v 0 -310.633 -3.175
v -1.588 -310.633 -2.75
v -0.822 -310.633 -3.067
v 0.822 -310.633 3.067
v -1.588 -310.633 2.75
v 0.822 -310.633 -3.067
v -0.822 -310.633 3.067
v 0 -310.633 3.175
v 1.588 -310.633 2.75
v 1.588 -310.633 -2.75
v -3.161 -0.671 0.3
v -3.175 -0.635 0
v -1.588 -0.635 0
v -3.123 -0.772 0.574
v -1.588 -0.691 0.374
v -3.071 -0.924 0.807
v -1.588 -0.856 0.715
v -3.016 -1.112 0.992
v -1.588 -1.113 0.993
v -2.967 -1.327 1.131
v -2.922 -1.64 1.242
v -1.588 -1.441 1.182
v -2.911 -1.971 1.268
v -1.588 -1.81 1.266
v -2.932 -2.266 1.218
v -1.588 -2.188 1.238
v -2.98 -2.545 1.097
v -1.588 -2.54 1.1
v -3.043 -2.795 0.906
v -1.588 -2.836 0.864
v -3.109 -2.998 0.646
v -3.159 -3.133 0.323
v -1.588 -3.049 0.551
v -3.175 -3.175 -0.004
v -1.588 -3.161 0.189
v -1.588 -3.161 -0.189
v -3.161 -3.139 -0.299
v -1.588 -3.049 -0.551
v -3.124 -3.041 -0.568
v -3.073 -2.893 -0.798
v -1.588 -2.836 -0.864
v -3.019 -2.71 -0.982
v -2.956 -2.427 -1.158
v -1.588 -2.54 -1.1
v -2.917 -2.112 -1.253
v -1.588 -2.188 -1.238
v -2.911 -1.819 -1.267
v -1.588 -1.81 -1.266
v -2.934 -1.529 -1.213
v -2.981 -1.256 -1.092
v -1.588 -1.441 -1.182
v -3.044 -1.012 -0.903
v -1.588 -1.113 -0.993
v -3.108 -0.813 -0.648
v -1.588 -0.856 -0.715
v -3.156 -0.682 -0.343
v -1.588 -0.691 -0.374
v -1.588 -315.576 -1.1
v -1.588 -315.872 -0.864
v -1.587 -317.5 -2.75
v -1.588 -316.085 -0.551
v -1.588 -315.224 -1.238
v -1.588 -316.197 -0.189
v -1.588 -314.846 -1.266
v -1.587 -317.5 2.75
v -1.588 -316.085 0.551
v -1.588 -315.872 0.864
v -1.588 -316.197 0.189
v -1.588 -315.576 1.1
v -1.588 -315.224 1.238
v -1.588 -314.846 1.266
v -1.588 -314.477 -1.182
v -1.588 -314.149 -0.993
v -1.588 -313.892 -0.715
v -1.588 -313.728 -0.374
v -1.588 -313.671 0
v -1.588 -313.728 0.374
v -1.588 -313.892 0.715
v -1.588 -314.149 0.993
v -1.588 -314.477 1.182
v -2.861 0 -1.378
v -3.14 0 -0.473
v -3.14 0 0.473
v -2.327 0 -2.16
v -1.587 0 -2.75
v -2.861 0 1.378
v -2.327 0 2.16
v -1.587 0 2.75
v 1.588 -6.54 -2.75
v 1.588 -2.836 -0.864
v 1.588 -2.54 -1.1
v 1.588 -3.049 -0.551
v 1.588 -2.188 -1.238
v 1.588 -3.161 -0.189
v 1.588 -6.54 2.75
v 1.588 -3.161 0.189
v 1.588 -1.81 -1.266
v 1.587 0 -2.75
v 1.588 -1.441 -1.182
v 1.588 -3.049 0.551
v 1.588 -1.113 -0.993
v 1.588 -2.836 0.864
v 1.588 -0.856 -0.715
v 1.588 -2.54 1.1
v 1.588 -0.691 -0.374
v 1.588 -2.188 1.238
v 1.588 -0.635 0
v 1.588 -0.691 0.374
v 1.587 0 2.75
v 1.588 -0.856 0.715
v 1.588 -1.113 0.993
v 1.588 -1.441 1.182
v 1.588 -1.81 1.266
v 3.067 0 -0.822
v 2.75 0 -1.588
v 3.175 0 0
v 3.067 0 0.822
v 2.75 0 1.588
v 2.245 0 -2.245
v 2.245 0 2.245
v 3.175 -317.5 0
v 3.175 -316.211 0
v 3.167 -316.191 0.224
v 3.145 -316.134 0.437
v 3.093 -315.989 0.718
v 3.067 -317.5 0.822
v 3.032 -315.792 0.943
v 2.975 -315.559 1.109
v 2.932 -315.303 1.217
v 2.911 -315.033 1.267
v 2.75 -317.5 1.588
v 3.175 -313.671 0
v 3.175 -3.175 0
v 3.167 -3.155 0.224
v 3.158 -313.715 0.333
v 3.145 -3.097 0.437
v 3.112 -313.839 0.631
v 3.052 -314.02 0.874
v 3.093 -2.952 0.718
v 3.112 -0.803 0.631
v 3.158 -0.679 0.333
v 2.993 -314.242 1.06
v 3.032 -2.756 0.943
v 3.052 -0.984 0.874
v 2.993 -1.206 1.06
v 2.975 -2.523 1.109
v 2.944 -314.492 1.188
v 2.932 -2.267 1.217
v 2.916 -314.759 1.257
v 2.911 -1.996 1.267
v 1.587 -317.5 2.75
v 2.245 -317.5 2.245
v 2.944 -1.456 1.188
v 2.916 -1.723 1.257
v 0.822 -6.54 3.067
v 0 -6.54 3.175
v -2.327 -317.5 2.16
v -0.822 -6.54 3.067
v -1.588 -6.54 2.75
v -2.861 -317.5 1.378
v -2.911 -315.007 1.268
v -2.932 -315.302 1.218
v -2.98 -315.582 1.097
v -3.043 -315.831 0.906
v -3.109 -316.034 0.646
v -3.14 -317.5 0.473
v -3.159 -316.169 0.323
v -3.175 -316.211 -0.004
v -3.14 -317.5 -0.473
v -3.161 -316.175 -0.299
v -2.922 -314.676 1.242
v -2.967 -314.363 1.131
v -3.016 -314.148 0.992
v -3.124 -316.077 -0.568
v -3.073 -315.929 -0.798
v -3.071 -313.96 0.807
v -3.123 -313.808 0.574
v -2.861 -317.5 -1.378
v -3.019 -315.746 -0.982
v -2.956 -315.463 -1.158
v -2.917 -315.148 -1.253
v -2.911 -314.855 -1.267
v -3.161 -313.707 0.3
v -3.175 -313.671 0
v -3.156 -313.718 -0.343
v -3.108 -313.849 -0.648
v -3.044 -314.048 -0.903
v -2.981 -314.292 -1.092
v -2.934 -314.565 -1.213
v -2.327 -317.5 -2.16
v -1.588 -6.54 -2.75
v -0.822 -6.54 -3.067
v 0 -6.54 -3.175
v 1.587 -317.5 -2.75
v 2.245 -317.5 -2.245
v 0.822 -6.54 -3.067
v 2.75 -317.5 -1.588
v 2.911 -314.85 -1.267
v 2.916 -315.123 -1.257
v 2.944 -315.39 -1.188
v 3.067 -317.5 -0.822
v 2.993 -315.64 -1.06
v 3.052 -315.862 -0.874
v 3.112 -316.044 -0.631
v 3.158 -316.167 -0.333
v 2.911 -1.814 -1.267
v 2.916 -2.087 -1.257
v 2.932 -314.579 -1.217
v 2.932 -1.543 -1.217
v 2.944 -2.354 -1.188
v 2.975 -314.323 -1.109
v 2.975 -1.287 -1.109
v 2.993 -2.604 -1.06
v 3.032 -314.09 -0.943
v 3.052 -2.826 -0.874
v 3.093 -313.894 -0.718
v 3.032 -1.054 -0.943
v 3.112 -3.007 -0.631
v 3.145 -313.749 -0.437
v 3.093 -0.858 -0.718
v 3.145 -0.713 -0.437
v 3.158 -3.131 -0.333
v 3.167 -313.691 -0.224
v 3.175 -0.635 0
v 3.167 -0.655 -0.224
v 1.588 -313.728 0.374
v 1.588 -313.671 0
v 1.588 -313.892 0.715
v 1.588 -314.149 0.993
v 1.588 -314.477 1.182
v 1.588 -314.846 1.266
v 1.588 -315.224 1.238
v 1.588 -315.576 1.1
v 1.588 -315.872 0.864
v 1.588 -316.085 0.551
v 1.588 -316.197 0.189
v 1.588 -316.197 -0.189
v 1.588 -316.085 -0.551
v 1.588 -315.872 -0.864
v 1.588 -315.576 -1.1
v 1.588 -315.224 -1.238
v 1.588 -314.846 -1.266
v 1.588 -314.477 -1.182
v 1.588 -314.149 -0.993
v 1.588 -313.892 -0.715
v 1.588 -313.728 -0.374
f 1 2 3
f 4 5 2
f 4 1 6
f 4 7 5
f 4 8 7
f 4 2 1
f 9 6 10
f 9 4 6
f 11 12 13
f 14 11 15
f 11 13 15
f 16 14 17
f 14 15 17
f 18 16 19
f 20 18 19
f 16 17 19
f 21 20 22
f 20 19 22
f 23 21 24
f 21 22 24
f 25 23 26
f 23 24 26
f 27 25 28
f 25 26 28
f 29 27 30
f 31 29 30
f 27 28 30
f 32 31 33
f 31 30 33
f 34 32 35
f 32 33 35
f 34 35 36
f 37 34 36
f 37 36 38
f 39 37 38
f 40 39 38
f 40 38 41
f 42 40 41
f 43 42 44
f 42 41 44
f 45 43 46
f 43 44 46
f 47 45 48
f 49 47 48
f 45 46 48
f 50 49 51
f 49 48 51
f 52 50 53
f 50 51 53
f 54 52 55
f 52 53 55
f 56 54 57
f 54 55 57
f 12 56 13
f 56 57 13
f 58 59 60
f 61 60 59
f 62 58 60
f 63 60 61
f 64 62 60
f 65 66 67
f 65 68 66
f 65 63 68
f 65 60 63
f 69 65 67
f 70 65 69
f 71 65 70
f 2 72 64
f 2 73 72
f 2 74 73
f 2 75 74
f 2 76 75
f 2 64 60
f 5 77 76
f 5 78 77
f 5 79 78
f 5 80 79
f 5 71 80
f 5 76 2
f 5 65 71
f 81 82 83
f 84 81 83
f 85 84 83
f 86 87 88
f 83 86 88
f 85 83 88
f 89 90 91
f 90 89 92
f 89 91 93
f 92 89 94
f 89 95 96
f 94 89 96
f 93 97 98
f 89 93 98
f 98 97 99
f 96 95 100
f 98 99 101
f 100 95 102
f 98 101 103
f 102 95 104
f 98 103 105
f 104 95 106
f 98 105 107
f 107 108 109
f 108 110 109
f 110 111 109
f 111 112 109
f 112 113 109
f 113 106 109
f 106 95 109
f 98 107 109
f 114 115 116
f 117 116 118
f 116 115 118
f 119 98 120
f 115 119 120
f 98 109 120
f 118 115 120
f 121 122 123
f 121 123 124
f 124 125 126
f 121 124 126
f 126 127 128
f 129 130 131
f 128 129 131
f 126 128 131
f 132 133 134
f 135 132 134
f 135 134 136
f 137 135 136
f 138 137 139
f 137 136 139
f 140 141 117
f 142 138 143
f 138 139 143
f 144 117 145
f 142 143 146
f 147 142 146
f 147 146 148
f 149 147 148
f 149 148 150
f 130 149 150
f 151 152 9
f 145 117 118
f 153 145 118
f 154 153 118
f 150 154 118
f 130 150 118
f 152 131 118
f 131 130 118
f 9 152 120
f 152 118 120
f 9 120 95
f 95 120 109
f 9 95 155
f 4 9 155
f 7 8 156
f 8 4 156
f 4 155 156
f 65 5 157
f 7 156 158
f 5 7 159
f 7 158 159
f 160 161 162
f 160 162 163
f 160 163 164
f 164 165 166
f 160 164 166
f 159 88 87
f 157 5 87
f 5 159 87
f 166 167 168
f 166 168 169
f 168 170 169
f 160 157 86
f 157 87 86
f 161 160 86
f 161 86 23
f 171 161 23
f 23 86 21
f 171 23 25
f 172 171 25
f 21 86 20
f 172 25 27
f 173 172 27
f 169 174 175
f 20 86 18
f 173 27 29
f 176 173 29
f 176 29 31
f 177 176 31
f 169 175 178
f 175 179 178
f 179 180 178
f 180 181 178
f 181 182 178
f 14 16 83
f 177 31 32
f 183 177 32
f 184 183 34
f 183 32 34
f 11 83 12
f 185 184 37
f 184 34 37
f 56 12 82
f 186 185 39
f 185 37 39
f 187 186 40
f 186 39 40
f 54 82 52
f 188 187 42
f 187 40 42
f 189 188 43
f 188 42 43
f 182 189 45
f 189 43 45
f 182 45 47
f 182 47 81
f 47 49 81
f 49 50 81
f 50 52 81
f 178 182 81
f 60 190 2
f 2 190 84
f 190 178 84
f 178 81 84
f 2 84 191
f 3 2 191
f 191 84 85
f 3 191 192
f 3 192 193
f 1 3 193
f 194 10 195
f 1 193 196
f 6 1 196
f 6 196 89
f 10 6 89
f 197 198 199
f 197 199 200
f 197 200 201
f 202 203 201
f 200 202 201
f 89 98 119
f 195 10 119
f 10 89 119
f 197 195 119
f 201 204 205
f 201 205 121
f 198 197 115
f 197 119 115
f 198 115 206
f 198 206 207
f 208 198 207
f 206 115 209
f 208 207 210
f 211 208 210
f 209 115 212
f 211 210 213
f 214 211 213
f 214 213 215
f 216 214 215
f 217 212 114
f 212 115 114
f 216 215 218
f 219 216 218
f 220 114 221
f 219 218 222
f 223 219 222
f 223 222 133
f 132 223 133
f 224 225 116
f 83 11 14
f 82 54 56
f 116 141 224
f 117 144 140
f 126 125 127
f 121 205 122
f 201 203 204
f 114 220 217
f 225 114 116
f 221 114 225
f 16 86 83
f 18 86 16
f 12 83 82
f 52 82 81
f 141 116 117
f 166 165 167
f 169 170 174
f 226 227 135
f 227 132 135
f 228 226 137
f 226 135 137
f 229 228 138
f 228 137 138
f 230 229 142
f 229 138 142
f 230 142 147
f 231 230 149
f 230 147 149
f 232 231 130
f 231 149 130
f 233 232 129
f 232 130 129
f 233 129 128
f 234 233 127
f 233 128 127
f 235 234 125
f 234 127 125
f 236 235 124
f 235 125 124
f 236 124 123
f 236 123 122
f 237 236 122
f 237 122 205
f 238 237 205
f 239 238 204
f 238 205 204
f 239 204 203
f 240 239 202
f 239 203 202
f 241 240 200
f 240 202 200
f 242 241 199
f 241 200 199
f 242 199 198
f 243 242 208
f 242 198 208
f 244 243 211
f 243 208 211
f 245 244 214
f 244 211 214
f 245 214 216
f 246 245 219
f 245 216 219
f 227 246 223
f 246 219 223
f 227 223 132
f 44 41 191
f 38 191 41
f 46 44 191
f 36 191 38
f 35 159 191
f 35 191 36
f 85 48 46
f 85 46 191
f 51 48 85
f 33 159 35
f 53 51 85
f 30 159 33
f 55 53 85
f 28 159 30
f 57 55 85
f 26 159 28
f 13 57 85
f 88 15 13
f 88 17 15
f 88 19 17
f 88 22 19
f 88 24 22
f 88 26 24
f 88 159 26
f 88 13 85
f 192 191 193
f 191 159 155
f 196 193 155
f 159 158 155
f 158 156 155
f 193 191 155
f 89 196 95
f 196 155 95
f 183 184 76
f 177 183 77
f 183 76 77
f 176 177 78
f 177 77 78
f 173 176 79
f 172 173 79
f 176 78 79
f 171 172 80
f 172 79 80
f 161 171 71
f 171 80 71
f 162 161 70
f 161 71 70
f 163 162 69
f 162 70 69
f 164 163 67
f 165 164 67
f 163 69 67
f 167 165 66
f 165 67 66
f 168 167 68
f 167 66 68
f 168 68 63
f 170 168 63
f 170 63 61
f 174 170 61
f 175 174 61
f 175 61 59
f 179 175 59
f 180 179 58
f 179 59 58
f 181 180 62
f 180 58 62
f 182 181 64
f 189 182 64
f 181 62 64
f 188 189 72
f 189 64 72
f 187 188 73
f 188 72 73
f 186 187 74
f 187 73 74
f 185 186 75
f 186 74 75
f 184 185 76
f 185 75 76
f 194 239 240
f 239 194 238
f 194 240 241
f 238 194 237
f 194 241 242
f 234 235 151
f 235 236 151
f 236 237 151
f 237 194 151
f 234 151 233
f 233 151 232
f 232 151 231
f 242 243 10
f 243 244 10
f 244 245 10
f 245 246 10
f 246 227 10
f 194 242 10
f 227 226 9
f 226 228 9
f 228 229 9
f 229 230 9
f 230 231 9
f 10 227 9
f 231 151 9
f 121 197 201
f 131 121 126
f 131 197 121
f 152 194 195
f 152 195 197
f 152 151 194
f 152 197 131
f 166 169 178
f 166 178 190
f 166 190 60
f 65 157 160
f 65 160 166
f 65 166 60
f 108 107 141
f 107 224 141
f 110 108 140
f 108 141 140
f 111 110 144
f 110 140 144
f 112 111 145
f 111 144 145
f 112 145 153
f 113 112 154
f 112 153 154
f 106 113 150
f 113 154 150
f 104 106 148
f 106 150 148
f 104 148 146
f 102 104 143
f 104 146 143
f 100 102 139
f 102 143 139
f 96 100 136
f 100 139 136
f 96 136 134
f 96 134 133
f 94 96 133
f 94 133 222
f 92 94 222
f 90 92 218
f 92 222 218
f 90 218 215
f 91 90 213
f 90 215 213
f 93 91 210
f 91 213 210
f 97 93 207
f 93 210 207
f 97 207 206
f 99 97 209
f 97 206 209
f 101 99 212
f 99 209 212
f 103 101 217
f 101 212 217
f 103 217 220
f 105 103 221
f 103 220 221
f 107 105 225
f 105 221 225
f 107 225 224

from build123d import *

# Parameters (mm, degrees)
F0_R      = 3.175
F1_DEPTH  = 298.45
F2_W      = 3.175
F2_H      = 13.081
F3_DEPTH  = 12.7
F4_R      = 1.27
F5_DEPTH  = 12.7
F6_DEPTH  = 19.05
F7_W      = 3.175
F7_H      = 12.7
F8_DEPTH  = 12.7
F9_R      = 1.27
F10_DEPTH = 12.7


with BuildPart() as f1:
    # F0 (on Front) → F1 (new body)
    with BuildSketch(Plane.XZ):
        Circle(F0_R)
    extrude(amount=F1_DEPTH)

    # F2 (on Top) → F3 (cut, symmetric)
    with BuildSketch(Plane.XY):
        Rectangle(F2_W, F2_H)
    extrude(amount=F3_DEPTH, both=True, mode=Mode.SUBTRACT)

    # F4 (on Right) → F5 (cut, symmetric)
    with BuildSketch(Plane.YZ):
        with Locations((-1.905, 0)):
            Circle(F4_R)
    extrude(amount=F5_DEPTH, both=True, mode=Mode.SUBTRACT)

    # F6 (add): a face of the model
    f6_faces = [f1.faces().sort_by_distance(p)[0] for p in [
        (0, -298.45, 0),
    ]]
    extrude(f6_faces, amount=F6_DEPTH)

    # F7 (on Top) → F8 (cut, symmetric)
    with BuildSketch(Plane.XY):
        with Locations((0, -316.9831931591)):
            Rectangle(F7_W, F7_H)
    extrude(amount=F8_DEPTH, both=True, mode=Mode.SUBTRACT)

    # F9 (on Right) → F10 (cut, symmetric)
    with BuildSketch(Plane.YZ):
        with Locations((-314.9411380291, 0)):
            Circle(F9_R)
    extrude(amount=F10_DEPTH, both=True, mode=Mode.SUBTRACT)


solid = f1.part
